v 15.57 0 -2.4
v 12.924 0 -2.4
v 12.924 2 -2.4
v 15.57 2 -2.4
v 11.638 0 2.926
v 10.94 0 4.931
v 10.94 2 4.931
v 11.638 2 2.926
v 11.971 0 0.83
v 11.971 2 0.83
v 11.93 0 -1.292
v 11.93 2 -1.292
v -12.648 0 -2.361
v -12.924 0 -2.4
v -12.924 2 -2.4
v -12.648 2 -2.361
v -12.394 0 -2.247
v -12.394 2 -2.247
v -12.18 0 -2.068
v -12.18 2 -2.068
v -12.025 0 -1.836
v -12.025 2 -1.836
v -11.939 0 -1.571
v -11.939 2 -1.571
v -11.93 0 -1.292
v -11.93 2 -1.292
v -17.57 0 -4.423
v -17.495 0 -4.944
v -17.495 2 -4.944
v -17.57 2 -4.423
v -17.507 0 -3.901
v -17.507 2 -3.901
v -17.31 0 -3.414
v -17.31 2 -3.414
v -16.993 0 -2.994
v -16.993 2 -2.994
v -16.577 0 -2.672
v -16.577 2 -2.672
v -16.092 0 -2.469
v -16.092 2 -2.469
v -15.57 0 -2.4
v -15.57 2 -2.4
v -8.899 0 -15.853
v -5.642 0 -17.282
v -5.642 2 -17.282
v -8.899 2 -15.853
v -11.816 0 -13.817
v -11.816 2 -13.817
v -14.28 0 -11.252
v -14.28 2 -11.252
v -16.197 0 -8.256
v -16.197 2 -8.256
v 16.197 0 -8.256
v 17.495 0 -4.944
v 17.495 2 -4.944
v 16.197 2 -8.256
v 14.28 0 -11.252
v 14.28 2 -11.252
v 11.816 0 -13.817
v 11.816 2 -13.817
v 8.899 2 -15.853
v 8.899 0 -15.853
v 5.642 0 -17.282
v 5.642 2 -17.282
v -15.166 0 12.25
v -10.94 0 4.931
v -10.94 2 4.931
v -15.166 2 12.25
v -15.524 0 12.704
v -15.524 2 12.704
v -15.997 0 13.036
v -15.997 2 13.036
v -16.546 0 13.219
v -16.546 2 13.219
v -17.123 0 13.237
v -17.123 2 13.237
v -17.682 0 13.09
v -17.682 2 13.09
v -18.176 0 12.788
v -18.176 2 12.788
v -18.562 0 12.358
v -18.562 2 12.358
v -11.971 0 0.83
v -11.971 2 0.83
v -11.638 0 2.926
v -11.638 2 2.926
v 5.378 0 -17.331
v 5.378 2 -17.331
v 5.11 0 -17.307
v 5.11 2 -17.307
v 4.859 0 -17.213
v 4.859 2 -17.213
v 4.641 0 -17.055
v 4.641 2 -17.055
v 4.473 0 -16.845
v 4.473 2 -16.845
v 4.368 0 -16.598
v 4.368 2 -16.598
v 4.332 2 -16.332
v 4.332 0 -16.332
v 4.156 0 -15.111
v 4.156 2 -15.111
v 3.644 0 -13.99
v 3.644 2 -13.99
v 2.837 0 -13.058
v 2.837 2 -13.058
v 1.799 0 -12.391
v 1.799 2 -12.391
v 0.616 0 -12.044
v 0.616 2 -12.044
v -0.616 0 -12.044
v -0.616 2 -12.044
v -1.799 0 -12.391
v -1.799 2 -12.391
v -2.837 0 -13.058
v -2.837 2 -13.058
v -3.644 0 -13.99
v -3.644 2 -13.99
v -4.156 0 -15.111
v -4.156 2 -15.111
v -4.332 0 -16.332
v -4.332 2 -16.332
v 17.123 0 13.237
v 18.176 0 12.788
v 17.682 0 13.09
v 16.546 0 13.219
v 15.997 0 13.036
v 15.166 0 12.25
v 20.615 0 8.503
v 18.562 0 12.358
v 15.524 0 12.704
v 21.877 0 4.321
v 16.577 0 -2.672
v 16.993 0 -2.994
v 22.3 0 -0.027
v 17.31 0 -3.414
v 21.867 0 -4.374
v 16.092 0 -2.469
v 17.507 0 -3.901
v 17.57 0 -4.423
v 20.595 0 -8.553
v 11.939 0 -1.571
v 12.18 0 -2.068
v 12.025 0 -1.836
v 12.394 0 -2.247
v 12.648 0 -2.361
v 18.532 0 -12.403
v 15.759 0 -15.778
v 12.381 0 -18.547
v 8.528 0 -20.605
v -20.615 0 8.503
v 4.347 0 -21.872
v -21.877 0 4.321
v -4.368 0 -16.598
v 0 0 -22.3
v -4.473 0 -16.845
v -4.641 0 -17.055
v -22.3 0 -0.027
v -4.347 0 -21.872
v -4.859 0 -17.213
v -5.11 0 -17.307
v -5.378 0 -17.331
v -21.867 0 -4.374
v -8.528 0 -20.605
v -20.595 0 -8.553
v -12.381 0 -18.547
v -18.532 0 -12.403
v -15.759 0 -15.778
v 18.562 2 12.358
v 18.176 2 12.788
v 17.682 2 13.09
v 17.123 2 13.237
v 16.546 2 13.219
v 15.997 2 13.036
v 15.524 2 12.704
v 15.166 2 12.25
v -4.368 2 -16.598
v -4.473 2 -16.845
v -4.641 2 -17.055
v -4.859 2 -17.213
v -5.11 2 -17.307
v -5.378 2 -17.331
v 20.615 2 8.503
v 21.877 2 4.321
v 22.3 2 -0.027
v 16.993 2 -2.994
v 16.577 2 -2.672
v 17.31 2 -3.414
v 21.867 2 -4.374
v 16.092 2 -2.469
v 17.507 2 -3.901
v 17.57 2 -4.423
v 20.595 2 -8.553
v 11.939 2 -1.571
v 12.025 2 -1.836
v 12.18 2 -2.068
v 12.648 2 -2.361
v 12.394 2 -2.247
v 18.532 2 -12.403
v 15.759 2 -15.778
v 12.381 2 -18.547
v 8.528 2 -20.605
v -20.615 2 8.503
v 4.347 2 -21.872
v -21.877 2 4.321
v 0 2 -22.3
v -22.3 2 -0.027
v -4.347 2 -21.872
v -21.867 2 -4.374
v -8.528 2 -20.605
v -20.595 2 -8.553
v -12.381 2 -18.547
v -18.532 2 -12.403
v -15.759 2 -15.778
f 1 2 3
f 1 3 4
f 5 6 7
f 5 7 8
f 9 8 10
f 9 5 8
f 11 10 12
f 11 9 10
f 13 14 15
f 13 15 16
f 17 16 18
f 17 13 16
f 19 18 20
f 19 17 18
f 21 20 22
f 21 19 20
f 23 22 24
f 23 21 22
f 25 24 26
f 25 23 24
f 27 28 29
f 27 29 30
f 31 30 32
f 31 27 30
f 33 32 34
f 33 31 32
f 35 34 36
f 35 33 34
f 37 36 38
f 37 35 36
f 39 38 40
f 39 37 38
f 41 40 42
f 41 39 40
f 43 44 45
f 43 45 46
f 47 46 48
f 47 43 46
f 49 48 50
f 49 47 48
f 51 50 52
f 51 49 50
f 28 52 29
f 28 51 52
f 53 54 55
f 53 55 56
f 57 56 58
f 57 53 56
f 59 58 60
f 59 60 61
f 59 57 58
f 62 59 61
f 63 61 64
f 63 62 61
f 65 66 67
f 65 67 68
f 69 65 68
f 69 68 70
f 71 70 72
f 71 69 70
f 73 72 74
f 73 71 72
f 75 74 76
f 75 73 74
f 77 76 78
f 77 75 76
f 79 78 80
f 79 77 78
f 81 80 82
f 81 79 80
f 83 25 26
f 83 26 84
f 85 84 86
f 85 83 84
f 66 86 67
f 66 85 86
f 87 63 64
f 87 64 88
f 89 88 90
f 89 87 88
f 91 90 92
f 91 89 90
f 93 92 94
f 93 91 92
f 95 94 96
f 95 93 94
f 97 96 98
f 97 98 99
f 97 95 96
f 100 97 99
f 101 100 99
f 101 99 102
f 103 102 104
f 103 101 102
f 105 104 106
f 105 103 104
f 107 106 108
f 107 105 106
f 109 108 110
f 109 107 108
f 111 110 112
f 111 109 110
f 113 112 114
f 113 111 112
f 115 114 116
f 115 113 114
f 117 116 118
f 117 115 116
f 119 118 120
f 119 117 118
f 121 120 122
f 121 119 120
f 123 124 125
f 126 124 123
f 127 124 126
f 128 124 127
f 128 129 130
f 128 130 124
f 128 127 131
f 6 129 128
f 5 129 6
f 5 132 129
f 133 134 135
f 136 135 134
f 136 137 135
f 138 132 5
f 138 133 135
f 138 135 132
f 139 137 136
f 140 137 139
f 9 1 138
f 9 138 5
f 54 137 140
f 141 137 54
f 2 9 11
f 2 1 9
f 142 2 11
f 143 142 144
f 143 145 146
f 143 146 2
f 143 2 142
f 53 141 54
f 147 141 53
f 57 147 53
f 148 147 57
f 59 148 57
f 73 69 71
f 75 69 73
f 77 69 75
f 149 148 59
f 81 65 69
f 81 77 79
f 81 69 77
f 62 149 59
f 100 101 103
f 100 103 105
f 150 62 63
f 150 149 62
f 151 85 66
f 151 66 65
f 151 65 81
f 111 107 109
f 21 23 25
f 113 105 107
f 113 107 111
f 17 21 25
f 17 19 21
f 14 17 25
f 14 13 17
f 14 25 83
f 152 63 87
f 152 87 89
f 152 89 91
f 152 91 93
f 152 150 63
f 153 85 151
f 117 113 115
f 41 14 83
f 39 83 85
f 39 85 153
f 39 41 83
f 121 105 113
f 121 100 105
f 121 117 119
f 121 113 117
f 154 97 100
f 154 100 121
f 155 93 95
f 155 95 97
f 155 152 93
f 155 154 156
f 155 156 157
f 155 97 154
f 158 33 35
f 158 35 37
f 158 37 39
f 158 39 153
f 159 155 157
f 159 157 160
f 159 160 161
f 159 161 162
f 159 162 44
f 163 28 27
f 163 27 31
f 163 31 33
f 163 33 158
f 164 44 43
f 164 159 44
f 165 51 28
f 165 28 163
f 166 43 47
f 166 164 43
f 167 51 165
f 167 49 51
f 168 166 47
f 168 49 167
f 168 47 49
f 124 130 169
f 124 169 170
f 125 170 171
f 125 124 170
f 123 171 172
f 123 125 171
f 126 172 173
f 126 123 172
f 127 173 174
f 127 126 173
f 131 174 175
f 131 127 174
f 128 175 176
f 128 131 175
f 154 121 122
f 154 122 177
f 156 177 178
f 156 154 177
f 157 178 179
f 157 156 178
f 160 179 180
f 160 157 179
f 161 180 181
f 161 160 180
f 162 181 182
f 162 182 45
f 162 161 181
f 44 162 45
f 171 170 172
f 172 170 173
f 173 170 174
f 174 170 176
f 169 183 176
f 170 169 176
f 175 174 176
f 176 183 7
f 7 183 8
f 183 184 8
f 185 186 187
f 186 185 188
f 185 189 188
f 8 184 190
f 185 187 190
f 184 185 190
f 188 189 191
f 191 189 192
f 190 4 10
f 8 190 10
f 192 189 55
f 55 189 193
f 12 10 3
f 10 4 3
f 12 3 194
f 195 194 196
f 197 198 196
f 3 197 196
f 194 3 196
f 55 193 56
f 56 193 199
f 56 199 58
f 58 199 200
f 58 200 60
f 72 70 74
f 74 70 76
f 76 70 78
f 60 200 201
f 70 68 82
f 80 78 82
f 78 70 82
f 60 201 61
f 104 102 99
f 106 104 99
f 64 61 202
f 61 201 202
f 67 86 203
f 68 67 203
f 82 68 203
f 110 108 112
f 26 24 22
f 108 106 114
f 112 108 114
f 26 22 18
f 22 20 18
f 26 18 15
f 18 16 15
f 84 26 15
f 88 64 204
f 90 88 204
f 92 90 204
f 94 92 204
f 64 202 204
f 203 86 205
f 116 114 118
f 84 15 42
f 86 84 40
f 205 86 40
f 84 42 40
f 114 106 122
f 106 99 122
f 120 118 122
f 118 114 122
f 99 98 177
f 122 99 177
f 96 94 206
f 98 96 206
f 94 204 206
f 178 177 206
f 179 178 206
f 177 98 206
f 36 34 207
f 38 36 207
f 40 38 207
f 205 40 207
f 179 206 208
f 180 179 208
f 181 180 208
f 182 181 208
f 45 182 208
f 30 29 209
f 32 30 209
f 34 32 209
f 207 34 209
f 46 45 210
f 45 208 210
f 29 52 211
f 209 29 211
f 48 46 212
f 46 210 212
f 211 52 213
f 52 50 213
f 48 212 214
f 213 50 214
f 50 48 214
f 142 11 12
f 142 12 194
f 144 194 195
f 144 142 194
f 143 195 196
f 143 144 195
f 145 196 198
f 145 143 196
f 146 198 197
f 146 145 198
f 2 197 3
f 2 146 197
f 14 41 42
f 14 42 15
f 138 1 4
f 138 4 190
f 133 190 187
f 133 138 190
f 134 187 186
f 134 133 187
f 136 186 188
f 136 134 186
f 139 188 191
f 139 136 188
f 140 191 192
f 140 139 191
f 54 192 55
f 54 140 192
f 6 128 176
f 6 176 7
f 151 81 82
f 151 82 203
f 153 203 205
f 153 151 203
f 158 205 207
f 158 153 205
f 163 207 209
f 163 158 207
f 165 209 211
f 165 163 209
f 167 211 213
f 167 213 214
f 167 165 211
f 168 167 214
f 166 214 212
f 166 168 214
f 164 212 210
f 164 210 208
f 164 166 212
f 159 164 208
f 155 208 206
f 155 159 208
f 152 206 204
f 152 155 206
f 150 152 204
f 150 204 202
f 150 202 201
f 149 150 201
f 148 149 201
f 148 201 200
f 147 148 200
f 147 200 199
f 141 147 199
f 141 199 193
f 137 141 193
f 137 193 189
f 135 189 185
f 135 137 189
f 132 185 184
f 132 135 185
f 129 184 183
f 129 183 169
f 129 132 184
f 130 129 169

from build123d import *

# Parameters (mm, degrees)
EXTRUDE_1_DEPTH = 2


with BuildPart() as part:
    # 草图1 → 凸台-拉伸1 (new body)
    with BuildSketch(Plane(origin=(0, 0, 0), x_dir=(1, 0, 0), z_dir=(0, 1, 0))):
        with BuildLine():
            Line((12.924395537, 2.4), (15.570240846, 2.4))
            ThreePointArc((15.570240846, 2.4), (17.165195809, 3.193302579), (17.494868886, 4.943881335))
            ThreePointArc((17.494868886, 4.943881335), (13.110639725, 12.594583201), (5.642066631, 17.282346025))
            ThreePointArc((5.642066631, 17.282346025), (4.744501657, 17.141149105), (4.331721931, 16.331721931))
            ThreePointArc((4.331721931, 16.331721931), (0, 12), (-4.331721931, 16.331721931))
            ThreePointArc((-4.331721931, 16.331721931), (-4.744501657, 17.141149105), (-5.642066631, 17.282346025))
            ThreePointArc((-5.642066631, 17.282346025), (-13.110639725, 12.594583201), (-17.494868886, 4.943881335))
            ThreePointArc((-17.494868886, 4.943881335), (-17.165195809, 3.193302579), (-15.570240846, 2.4))
            Line((-15.570240846, 2.4), (-12.924395537, 2.4))
            ThreePointArc((-12.924395537, 2.4), (-12.18018713, 2.067947488), (-11.930211265, 1.292307692))
            ThreePointArc((-11.930211265, 1.292307692), (-11.850930243, -1.885590724), (-10.94, -4.931166191))
            Line((-10.94, -4.931166191), (-15.165520228, -12.249981915))
            ThreePointArc((-15.165520228, -12.249981915), (-16.833795519, -13.248964827), (-18.56235636, -12.358354517))
            ThreePointArc((-18.56235636, -12.358354517), (0, 22.3), (18.56235636, -12.358354517))
            ThreePointArc((18.56235636, -12.358354517), (16.833795519, -13.248964827), (15.165520228, -12.249981915))
            Line((15.165520228, -12.249981915), (10.94, -4.931166191))
            ThreePointArc((10.94, -4.931166191), (11.850930243, -1.885590724), (11.930211265, 1.292307692))
            ThreePointArc((11.930211265, 1.292307692), (12.18018713, 2.067947488), (12.924395537, 2.4))
        make_face()
    extrude(amount=EXTRUDE_1_DEPTH)


solid = part.part
